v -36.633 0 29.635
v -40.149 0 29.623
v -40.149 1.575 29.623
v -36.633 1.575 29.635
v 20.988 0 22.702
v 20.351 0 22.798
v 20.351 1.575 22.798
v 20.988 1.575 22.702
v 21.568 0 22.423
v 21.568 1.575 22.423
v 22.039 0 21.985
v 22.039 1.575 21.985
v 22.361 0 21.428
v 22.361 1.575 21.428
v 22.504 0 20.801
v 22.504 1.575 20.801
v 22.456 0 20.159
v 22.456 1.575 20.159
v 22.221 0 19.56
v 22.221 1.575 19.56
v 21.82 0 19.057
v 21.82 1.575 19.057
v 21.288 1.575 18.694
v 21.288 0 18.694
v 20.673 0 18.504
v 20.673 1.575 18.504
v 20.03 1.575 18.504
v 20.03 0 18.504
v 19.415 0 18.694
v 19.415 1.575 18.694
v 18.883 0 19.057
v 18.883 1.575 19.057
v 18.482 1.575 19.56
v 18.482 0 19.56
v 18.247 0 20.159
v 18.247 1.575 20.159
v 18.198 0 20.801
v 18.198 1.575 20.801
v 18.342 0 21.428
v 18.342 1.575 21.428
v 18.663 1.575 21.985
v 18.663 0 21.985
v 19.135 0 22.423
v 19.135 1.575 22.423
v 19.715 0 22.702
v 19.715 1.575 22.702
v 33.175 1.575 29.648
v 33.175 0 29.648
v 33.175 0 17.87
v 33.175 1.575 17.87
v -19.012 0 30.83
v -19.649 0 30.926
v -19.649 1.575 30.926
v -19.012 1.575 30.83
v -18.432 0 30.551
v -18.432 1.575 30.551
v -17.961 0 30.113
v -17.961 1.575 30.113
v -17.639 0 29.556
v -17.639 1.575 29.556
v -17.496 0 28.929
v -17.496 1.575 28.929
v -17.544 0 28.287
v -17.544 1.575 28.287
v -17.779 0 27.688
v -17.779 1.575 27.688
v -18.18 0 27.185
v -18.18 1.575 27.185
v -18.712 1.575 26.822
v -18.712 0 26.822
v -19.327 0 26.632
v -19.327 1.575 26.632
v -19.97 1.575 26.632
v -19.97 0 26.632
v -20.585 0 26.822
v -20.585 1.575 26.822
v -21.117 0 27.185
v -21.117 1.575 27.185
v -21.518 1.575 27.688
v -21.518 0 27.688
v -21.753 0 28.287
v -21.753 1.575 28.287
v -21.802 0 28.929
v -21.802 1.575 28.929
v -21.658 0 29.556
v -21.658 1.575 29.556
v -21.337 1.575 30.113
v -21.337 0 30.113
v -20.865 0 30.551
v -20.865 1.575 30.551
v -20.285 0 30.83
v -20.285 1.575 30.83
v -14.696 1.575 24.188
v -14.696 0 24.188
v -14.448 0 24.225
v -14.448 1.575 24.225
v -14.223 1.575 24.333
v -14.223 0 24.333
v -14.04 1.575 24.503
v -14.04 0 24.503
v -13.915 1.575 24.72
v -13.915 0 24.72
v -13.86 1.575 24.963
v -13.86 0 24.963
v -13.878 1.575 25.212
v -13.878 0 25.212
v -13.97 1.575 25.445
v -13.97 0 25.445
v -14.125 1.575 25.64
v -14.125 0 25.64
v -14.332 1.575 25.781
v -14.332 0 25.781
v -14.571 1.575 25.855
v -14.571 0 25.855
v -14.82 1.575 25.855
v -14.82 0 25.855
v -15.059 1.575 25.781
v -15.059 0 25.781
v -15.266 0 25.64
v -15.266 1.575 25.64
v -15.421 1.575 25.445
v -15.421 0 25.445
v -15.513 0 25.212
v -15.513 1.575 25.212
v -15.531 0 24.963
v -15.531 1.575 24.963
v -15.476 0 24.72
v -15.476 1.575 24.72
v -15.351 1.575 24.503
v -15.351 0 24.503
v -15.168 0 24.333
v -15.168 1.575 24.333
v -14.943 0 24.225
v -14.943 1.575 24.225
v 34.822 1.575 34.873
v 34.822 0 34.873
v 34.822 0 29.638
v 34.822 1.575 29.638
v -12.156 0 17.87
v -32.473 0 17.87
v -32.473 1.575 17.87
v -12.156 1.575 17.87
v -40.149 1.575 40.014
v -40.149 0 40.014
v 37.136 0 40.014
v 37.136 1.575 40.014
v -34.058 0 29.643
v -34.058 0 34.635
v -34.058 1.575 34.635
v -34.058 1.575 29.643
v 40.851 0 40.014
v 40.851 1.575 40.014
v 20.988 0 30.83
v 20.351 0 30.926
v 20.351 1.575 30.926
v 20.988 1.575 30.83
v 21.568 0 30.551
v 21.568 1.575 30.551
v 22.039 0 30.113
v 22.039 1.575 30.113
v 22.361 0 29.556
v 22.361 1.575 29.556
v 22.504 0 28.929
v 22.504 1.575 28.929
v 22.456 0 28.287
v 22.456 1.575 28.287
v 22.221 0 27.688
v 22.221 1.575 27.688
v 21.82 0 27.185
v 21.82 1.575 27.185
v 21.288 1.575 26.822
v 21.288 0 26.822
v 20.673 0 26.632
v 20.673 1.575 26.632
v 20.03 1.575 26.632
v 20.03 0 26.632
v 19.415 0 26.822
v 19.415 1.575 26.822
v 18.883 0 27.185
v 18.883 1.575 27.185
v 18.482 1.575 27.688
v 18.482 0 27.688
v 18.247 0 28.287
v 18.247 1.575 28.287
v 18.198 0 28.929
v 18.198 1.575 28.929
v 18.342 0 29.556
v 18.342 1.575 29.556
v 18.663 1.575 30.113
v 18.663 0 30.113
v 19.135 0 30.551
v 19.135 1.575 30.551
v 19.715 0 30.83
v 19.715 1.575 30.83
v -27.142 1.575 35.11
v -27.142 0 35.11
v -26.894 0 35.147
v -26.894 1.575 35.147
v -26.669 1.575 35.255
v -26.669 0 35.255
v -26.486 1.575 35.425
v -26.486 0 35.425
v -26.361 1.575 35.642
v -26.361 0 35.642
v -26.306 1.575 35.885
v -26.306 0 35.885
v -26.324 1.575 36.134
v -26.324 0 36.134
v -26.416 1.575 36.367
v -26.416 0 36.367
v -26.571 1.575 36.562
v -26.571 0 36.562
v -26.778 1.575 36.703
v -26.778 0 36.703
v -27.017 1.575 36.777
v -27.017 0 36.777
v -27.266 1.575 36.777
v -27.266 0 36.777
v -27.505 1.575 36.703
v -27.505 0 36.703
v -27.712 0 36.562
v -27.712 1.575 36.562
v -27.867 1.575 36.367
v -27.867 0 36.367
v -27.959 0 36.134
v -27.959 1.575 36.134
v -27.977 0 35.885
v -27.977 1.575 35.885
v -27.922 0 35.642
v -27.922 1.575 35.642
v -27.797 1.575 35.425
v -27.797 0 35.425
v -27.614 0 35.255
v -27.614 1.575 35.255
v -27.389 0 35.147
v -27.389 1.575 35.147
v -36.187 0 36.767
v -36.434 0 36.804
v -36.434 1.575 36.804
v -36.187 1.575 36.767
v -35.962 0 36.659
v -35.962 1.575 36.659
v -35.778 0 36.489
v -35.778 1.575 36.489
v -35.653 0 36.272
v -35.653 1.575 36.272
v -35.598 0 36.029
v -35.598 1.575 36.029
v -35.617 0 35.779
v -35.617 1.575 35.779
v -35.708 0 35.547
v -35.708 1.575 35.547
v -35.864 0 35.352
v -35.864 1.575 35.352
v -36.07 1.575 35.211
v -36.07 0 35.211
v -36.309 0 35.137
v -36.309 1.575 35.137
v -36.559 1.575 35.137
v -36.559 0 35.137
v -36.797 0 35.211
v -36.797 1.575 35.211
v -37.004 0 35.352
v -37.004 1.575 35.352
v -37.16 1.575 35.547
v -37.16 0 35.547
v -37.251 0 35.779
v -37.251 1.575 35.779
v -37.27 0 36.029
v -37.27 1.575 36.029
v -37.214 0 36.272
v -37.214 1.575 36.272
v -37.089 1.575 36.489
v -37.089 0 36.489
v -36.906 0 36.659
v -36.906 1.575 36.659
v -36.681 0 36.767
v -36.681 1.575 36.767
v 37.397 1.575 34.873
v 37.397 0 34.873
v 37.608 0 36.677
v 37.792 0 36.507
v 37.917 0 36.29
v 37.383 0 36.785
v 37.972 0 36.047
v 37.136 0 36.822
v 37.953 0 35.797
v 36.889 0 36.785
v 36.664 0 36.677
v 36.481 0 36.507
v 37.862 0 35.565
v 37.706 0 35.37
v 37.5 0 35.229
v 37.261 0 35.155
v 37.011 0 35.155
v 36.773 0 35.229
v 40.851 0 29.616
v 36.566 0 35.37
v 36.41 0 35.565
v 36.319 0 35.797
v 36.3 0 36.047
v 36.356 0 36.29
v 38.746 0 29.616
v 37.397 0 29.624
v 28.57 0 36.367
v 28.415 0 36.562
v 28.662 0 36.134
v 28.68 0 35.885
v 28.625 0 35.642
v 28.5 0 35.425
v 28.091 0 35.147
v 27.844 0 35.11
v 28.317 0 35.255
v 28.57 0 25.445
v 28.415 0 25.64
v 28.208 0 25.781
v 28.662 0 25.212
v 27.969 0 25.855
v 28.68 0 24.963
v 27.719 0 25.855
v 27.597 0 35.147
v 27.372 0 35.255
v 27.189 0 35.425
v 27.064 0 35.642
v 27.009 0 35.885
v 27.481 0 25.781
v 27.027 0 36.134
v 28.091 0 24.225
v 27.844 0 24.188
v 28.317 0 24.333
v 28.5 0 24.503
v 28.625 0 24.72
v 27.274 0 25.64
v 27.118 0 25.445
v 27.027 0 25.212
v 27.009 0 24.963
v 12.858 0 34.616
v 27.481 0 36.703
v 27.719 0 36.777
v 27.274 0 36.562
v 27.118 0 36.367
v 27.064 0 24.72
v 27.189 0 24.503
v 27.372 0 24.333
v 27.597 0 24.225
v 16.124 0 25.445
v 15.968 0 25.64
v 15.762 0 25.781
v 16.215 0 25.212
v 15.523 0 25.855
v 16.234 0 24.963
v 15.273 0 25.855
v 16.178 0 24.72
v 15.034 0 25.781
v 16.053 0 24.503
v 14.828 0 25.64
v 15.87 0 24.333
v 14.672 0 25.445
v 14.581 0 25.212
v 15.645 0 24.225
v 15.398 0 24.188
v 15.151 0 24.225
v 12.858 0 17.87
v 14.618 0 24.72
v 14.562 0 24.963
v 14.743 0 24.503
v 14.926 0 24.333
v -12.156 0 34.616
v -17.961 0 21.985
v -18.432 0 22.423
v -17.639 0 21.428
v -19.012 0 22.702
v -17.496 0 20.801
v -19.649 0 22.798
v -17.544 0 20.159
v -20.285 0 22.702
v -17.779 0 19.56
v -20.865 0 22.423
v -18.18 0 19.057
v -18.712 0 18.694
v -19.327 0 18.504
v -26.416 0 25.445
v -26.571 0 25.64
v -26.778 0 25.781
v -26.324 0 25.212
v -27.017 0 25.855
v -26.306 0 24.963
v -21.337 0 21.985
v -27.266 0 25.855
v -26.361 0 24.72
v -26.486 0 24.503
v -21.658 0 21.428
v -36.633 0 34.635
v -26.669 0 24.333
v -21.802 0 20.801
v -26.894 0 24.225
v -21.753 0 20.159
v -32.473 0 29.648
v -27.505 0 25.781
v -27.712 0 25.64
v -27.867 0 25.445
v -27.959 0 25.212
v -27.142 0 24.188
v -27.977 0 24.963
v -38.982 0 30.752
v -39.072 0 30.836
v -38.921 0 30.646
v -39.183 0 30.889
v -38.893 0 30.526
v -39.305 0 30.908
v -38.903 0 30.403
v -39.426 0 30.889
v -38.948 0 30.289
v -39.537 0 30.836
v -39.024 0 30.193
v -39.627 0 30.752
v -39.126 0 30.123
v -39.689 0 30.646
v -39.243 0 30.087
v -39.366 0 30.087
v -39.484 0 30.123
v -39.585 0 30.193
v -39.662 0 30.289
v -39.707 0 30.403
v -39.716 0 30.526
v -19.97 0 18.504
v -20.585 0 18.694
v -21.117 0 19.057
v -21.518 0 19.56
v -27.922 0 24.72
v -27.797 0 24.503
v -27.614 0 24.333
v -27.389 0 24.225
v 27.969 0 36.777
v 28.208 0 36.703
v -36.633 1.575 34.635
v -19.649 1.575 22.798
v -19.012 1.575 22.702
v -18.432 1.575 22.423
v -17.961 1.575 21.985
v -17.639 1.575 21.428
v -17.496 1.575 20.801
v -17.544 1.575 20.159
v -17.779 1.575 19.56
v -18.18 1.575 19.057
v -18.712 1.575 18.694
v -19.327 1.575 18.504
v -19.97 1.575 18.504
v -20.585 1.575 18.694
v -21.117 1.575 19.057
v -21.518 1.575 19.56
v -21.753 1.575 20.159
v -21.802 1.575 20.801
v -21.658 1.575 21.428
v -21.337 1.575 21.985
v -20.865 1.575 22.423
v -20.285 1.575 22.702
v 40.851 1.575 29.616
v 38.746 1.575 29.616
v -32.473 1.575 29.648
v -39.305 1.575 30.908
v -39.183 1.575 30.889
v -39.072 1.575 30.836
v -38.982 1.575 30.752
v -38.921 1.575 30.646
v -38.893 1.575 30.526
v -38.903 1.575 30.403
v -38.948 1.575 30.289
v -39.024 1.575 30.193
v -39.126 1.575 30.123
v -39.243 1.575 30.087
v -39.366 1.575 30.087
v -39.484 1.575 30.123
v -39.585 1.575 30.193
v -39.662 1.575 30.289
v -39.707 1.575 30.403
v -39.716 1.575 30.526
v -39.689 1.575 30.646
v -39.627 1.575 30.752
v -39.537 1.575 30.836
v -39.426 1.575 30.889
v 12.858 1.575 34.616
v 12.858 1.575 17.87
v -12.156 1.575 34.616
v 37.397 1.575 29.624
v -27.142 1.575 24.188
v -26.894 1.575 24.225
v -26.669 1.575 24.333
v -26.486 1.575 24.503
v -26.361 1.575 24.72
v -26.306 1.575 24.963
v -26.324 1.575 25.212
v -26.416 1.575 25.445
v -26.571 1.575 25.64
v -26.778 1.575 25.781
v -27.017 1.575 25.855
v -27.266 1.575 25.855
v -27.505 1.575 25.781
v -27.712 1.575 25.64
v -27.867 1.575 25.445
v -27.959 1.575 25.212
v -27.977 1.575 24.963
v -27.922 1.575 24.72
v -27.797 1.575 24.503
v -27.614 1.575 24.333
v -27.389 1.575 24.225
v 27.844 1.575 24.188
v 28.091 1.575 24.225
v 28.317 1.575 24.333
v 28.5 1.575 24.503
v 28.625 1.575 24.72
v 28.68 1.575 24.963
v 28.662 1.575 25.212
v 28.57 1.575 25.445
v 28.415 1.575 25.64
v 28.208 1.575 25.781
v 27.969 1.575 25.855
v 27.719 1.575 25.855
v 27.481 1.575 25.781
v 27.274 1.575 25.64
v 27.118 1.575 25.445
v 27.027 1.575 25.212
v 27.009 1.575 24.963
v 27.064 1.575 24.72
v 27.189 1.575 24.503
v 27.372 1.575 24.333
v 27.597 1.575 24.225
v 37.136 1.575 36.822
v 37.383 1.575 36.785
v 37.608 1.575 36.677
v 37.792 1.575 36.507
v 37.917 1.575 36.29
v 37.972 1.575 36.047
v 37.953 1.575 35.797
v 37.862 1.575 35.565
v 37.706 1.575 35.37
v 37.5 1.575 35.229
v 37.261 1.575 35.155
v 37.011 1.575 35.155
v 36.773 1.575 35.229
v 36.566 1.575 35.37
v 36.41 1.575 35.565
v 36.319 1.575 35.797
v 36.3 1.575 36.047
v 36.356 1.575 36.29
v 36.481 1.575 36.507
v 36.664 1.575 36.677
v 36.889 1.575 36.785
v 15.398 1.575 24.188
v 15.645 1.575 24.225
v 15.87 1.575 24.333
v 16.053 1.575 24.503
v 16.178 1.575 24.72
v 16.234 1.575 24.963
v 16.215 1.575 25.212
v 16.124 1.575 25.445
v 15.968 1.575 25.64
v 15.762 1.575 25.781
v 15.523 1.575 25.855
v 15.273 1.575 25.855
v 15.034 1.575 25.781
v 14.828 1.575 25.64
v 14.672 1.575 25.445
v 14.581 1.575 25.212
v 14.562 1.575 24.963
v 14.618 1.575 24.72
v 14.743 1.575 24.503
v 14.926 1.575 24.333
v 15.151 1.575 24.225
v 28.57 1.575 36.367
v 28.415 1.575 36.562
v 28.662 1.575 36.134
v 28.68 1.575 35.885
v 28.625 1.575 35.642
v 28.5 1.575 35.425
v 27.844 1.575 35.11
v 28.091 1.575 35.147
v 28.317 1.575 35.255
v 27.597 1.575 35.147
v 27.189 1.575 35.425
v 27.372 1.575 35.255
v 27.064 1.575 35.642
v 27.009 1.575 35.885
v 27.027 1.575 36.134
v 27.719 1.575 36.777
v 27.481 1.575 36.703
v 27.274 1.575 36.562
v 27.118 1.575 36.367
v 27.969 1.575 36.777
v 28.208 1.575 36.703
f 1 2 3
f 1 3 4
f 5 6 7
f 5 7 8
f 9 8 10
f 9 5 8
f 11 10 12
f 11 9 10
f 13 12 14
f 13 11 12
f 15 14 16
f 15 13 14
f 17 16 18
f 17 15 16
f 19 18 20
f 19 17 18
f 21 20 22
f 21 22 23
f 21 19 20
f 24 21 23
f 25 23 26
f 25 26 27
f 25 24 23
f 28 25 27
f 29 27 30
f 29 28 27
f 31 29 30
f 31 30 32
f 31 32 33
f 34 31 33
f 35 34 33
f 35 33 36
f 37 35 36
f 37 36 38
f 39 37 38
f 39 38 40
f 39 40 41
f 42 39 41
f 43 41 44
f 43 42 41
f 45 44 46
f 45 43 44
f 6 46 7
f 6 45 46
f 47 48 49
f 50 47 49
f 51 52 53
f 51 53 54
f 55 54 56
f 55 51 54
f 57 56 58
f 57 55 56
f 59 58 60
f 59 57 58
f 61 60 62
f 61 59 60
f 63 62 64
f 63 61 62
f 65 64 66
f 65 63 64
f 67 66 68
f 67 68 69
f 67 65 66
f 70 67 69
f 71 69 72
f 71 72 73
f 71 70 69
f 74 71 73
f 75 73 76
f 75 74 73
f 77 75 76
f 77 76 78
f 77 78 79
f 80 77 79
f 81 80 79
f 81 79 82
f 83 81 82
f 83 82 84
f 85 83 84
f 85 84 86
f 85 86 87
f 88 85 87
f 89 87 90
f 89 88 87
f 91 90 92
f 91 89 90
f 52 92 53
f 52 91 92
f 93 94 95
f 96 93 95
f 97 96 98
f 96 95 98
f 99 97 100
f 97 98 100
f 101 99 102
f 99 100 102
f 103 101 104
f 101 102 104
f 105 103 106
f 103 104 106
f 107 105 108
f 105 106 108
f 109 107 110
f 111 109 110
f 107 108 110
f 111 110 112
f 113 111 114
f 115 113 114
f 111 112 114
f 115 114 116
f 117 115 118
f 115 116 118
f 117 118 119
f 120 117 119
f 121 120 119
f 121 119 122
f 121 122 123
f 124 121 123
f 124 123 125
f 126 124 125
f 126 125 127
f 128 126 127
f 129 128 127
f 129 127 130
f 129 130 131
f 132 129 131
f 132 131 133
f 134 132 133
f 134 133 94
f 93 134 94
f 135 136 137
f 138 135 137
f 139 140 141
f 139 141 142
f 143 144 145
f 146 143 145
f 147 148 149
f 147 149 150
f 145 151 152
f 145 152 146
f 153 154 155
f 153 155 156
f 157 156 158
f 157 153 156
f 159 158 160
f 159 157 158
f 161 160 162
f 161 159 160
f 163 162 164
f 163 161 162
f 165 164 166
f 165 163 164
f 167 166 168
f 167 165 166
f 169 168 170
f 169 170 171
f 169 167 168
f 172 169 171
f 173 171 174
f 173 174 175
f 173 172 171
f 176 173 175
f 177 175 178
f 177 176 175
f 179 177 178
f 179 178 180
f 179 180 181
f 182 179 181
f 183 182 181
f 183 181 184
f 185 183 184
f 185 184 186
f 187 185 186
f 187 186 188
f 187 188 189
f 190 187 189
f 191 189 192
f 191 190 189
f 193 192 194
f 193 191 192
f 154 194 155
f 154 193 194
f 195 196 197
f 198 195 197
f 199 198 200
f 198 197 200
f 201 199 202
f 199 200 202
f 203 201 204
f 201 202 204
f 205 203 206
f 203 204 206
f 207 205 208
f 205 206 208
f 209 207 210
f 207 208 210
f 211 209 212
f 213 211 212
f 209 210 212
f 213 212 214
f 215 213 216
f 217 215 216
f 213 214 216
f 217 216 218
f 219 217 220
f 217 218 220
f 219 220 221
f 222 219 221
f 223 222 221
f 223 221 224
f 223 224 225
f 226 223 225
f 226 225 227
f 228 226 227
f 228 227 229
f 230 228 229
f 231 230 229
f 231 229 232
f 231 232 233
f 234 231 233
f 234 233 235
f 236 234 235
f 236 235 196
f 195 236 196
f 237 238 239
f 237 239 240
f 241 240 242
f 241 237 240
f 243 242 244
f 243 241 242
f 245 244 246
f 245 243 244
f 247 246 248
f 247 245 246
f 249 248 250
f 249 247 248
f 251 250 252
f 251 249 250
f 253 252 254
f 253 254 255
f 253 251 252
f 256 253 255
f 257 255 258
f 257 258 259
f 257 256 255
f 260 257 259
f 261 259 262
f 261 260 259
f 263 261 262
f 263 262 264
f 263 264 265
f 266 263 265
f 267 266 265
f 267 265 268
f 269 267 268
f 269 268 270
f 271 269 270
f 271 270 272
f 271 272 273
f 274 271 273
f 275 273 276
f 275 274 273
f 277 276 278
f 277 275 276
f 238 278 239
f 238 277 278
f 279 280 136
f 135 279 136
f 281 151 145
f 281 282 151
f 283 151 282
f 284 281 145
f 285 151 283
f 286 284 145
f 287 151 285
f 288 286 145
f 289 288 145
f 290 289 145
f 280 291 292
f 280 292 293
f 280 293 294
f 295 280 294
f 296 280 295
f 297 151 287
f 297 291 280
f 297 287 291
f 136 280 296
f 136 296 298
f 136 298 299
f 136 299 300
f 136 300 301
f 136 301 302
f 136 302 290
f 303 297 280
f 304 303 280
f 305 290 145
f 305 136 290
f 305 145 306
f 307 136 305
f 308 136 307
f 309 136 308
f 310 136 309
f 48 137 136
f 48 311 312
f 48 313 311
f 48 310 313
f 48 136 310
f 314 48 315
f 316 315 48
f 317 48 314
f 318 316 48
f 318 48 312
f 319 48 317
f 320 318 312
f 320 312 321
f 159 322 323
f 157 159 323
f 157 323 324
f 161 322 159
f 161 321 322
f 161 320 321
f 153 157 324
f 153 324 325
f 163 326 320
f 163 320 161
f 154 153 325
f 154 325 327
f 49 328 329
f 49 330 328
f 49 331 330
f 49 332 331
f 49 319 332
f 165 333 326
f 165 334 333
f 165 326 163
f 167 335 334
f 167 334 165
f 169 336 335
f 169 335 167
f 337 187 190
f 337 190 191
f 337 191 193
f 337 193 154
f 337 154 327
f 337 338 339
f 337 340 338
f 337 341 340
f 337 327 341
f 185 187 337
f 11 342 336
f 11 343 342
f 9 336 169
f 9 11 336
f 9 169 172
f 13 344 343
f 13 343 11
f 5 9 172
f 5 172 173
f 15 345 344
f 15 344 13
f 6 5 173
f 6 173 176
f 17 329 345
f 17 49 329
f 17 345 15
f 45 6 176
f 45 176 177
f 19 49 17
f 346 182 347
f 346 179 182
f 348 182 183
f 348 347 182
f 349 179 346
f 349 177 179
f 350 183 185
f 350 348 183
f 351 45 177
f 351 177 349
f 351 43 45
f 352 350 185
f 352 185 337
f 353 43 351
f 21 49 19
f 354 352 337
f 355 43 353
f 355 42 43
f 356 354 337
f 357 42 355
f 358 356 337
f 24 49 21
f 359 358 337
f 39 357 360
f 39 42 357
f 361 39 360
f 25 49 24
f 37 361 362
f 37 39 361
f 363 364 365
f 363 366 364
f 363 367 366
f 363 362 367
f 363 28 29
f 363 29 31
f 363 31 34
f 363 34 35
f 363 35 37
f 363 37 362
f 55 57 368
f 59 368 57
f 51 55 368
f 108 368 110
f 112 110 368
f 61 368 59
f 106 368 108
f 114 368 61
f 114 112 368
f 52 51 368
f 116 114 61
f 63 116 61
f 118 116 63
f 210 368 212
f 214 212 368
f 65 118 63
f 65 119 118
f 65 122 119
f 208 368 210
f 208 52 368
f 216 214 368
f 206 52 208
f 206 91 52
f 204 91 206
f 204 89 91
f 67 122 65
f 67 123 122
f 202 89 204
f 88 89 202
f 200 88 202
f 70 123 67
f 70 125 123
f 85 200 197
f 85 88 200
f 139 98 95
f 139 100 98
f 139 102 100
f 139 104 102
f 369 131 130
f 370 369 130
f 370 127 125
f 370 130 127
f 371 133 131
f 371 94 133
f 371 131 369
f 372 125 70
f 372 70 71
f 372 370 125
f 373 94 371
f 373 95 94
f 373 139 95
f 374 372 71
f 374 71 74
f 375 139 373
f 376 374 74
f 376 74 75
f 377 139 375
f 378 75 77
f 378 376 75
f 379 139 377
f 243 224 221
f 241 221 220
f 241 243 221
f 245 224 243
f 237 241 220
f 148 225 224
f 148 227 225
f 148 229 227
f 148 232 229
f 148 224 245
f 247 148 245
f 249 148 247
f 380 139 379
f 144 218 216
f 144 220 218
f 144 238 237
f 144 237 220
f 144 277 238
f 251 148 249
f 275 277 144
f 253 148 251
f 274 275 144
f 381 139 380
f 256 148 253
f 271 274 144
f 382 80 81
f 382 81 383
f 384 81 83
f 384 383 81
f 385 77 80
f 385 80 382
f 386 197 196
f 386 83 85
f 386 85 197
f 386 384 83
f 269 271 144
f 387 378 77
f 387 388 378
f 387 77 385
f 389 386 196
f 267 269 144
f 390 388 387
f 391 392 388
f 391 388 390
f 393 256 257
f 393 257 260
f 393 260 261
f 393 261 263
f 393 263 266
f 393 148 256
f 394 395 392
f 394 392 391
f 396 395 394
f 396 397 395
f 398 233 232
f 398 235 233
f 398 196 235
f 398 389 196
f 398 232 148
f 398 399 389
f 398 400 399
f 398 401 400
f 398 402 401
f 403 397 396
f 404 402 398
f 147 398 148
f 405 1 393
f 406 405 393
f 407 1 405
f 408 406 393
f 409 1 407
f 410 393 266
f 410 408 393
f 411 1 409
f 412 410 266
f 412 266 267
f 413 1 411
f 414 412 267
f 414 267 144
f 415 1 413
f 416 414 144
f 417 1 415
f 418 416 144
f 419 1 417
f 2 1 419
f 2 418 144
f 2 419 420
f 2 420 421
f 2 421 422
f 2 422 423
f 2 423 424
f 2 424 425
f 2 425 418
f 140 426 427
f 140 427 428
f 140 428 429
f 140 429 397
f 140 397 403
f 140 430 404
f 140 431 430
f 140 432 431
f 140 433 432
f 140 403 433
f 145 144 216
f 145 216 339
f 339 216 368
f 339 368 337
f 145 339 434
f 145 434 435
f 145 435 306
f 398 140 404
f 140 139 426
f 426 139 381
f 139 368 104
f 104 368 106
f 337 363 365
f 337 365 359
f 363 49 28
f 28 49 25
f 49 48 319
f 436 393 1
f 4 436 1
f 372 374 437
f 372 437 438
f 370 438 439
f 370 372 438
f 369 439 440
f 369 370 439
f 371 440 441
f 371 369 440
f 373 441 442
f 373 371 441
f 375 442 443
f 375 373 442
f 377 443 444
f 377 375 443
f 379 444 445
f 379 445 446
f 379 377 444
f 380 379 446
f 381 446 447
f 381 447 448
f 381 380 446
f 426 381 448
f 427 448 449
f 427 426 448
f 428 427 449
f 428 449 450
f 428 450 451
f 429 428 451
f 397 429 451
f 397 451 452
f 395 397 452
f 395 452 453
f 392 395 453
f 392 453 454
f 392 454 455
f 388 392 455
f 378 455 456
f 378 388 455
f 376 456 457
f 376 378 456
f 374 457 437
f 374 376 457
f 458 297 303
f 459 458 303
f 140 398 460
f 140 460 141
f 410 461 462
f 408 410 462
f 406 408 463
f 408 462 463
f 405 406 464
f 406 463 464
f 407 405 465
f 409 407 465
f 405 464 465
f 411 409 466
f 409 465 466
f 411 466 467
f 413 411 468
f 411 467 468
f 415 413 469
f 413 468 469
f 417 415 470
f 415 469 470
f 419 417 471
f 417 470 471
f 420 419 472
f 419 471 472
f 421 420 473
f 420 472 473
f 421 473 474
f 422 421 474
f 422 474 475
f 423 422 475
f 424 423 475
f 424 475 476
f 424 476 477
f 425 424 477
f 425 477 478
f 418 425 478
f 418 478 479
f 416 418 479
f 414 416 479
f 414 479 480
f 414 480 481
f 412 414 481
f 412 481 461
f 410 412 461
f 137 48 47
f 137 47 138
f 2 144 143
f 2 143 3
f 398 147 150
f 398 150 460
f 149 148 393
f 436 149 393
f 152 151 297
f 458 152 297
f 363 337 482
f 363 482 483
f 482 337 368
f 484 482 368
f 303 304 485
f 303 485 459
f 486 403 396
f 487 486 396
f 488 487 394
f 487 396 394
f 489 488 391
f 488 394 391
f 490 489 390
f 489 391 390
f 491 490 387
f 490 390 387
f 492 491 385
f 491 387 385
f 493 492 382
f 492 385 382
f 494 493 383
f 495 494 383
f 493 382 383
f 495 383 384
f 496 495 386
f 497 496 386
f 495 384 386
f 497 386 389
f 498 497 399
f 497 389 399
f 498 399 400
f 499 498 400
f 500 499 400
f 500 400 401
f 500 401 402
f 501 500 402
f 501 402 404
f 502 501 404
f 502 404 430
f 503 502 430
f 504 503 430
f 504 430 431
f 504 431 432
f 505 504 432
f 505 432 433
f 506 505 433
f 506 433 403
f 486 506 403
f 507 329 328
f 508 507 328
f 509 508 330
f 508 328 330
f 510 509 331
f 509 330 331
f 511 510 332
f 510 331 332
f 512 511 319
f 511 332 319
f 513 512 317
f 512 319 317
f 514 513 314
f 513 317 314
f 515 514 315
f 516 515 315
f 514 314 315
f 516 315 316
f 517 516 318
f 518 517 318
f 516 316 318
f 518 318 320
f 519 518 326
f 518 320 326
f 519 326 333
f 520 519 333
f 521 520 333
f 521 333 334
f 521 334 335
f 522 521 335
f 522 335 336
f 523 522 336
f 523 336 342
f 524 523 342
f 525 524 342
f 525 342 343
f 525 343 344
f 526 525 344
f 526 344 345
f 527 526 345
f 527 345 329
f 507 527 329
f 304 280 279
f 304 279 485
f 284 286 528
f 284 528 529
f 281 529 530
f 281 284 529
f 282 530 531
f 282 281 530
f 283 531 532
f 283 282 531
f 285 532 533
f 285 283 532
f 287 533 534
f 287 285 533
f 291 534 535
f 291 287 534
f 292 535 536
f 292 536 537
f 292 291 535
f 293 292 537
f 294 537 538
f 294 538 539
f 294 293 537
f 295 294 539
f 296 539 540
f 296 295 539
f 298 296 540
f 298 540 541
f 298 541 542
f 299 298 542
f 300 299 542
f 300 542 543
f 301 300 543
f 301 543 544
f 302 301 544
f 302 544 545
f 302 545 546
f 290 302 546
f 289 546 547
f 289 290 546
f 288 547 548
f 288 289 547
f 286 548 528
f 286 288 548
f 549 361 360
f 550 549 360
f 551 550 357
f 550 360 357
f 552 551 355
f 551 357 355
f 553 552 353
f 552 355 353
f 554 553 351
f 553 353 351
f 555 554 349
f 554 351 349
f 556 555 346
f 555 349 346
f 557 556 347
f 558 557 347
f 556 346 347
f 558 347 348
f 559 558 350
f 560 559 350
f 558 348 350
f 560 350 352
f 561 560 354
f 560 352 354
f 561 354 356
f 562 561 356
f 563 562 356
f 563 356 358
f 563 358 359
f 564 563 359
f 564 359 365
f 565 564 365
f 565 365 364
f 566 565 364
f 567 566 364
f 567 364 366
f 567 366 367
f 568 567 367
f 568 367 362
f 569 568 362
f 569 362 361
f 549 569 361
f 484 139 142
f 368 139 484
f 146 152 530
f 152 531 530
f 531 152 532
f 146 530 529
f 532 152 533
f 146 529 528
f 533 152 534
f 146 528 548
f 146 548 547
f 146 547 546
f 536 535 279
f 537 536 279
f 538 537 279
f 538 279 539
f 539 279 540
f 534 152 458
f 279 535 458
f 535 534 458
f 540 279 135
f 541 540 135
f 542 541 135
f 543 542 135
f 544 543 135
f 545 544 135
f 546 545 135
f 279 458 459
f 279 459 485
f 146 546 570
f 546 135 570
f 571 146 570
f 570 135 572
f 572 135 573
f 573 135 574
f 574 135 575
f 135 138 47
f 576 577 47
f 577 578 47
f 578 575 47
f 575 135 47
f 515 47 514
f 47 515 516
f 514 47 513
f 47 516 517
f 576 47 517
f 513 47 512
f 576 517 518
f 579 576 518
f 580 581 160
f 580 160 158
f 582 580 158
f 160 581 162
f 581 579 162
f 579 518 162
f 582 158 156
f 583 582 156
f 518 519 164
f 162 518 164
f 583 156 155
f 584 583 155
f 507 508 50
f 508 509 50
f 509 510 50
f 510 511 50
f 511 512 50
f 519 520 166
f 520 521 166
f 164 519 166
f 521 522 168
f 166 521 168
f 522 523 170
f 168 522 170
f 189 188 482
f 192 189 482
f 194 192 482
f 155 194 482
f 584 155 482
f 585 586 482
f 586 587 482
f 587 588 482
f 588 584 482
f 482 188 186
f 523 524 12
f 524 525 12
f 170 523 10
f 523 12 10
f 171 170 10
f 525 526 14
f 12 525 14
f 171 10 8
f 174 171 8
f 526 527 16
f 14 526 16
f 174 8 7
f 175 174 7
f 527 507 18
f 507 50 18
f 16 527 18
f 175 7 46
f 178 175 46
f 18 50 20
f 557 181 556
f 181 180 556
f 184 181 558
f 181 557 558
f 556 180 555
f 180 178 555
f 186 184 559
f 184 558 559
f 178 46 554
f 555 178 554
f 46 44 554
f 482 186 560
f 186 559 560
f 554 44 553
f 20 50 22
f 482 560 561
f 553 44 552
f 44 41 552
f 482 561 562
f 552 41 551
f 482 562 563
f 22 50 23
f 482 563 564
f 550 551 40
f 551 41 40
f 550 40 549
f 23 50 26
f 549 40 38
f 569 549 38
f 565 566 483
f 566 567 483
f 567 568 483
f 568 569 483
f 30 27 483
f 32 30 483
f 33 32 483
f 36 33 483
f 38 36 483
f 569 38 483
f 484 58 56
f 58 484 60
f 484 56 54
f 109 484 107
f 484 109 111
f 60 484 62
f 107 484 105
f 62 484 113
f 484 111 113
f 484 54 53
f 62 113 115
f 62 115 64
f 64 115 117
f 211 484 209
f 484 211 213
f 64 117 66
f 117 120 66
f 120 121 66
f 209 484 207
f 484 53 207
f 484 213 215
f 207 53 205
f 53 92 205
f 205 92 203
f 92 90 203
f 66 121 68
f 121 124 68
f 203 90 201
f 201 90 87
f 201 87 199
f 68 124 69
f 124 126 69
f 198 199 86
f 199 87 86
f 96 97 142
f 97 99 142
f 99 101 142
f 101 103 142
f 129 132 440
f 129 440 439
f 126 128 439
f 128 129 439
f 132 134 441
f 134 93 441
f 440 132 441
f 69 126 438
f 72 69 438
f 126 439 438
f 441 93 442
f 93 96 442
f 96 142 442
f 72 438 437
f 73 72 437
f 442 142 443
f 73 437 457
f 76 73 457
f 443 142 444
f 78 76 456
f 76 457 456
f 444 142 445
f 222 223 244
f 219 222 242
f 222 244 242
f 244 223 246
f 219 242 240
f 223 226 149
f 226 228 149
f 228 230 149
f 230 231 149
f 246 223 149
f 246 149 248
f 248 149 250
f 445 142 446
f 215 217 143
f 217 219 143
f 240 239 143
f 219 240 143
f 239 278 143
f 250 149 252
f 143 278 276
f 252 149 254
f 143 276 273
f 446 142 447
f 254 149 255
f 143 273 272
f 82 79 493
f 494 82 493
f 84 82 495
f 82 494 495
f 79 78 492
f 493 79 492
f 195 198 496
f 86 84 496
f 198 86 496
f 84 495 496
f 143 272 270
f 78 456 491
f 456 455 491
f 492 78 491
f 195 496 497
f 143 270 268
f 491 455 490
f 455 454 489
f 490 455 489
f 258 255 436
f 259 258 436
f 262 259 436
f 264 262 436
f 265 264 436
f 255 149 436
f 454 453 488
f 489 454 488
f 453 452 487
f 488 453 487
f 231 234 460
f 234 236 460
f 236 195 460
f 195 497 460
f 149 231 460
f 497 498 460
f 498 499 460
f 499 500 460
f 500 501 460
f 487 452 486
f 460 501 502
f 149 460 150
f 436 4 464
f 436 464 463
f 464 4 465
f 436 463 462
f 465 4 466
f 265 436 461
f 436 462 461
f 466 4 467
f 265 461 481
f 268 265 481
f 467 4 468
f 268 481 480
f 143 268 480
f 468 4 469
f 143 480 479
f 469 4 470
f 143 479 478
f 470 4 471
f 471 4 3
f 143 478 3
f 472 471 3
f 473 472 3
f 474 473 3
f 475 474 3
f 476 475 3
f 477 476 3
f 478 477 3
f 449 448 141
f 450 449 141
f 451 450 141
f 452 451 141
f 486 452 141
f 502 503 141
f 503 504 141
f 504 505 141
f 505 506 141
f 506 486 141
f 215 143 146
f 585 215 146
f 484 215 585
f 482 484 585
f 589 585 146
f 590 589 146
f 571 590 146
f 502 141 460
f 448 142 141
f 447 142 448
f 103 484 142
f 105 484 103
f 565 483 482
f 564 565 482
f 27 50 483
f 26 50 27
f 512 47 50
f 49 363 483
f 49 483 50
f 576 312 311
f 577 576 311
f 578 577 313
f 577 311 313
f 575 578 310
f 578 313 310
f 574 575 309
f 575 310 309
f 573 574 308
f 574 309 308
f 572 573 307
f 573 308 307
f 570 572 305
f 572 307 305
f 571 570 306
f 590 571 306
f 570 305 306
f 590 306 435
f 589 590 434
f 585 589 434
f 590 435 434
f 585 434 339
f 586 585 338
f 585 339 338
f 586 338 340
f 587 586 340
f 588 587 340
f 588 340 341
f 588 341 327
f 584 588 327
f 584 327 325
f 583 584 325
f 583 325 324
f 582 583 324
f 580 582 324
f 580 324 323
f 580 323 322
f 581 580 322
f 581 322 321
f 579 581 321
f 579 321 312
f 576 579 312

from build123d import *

# Parameters (mm, degrees)
SKETCH1_R           = 0.8382
SKETCH1_R_2         = 2.159
BOSS_EXTRUDE1_DEPTH = 1.575
SKETCH2_W           = 86.242658642
SKETCH2_H           = 6.602
CUT_EXTRUDE1_DEPTH  = 65.362755899
CUT_EXTRUDE2_DEPTH  = 60.755092082
CUT_EXTRUDE3_DEPTH  = 60.755092082
SKETCH6_R           = 0.8382
CUT_EXTRUDE4_DEPTH  = 2.54
SKETCH7_W           = 65.648
SKETCH7_H           = 7.5
CUT_EXTRUDE5_DEPTH  = 58.2054366
SKETCH11_R          = 0.412551942
ID_HOLE_DEPTH       = 58.2054366
SKETCH12_W          = 2.575
SKETCH12_H          = 5
CUT_EXTRUDE6_DEPTH  = 58.2054366
SKETCH14_W          = 2.575
SKETCH14_H          = 17.002619879
CUT_EXTRUDE7_DEPTH  = 58.2054366


with BuildPart() as part:
    # Sketch1 → Boss-Extrude1 (new body)
    with BuildSketch(Plane(origin=(0, 0, 0), x_dir=(1, 0, 0), z_dir=(0, 1, 0))):
        Polygon((44.351293299, -40.014412246), (37.136293299, -40.014412246), (37.136293299, -46.615946892), (29.968293307, -46.615946892), (-30.083706693, -46.615946892), (-36.433706701, -46.615946892), (-36.433706701, -40.014412246), (-43.648706701, -40.014412246), (-43.648706701, -30.885946892), (-43.648706701, -29.647946892), (-42.378706693, -29.615946892), (-32.472706701, -29.647946892), (-32.472706701, -10.370428445), (-12.155556701, -10.370428445), (-12.155556701, -34.615947016), (-11.557706701, -34.615947016), (12.260293299, -34.615947016), (12.858143299, -34.615947016), (12.858143299, -10.370428445), (33.175293299, -10.370428445), (33.175293299, -12.929386892), (33.175293299, -29.647946892), (38.746293307, -29.615946892), (42.351293307, -29.615946892), (44.351293299, -29.615946892), (44.351293299, -31.651946892), align=None)
        with Locations(Location((-36.433706701, -35.965946892, 0), (0, 0, 270))):
            Circle(SKETCH1_R, mode=Mode.SUBTRACT)
        with Locations(Location((37.136293299, -35.983946892, 0), (0, 0, 270))):
            Circle(SKETCH1_R, mode=Mode.SUBTRACT)
        with Locations(Location((-19.648556701, -28.76738335, 0), (0, 0, 270))):
            Circle(SKETCH1_R_2, mode=Mode.SUBTRACT)
        with Locations(Location((-19.648556701, -20.63938335, 0), (0, 0, 270))):
            Circle(SKETCH1_R_2, mode=Mode.SUBTRACT)
        with Locations(Location((20.351397299, -20.63938335, 0), (0, 0, 270))):
            Circle(SKETCH1_R_2, mode=Mode.SUBTRACT)
        with Locations(Location((20.351397299, -28.76738335, 0), (0, 0, 270))):
            Circle(SKETCH1_R_2, mode=Mode.SUBTRACT)
    extrude(amount=BOSS_EXTRUDE1_DEPTH)

    # Sketch2 → Cut-Extrude1 (cut, through all)
    with BuildSketch(Plane.XZ):
        with Locations((-5.985036022, 43.314946892)):
            Rectangle(SKETCH2_W, SKETCH2_H)
    extrude(amount=-CUT_EXTRUDE1_DEPTH, mode=Mode.SUBTRACT)

    # Sketch3 → Cut-Extrude2 (cut, through all)
    with BuildSketch(Plane.XZ):
        Polygon((-40.148706701, 40.013946892), (-40.148706701, 29.623150607), (-34.773706693, 29.640513821), (-34.773706693, 8.975624969), (-46.772834391, 8.975624969), (-46.772834391, 40.013946892), align=None)
    extrude(amount=-CUT_EXTRUDE2_DEPTH, mode=Mode.SUBTRACT)

    # Sketch4 → Cut-Extrude3 (cut, through all)
    with BuildSketch(Plane.XZ):
        Polygon((40.851293299, 40.014412246), (40.851293299, 32.420104455), (40.851293299, 29.615946892), (35.476293307, 29.615946892), (35.476293307, 10.370428445), (54.710892309, 10.370428445), (54.710892309, 40.014412246), align=None)
    extrude(amount=-CUT_EXTRUDE3_DEPTH, mode=Mode.SUBTRACT)

    # Sketch6 → Cut-Extrude4 (cut)
    with BuildSketch(Plane(origin=(0, 0, 0), x_dir=(-1, 0, 0), z_dir=(0, -1, 0))):
        with Locations(Location((27.141556701, -35.947946892, 0), (0, 0, 90))):
            Circle(SKETCH6_R)
        with Locations(Location((27.141556701, -25.025946892, 0), (0, 0, 90))):
            Circle(SKETCH6_R)
        with Locations(Location((14.695556701, -25.025946892, 0), (0, 0, 90))):
            Circle(SKETCH6_R)
        with Locations(Location((-15.398143299, -25.025946892, 0), (0, 0, 90))):
            Circle(SKETCH6_R)
        with Locations(Location((-27.844397299, -25.025946892, 0), (0, 0, 90))):
            Circle(SKETCH6_R)
        with Locations(Location((-27.844397299, -35.947946892, 0), (0, 0, 90))):
            Circle(SKETCH6_R)
    extrude(amount=-CUT_EXTRUDE4_DEPTH, mode=Mode.SUBTRACT)

    # Sketch7 → Cut-Extrude5 (cut, through all)
    with BuildSketch(Plane.XZ):
        with Locations((0.351293299, 14.120428445)):
            Rectangle(SKETCH7_W, SKETCH7_H)
    extrude(amount=-CUT_EXTRUDE5_DEPTH, mode=Mode.SUBTRACT)

    # Sketch11 → ID HOLE (cut, through all)
    with BuildSketch(Plane(origin=(0, 1.575, 0), x_dir=(1, 0, 0), z_dir=(0, 1, 0))):
        with Locations(Location((-39.304798754, -30.495020326, 0), (0, 0, 270))):
            Circle(SKETCH11_R)
    extrude(amount=-ID_HOLE_DEPTH, mode=Mode.SUBTRACT)

    # Sketch12 → Cut-Extrude6 (cut, through all)
    with BuildSketch(Plane(origin=(0, 0, 0), x_dir=(-1, 0, 0), z_dir=(0, -1, 0))):
        with Locations((35.345206701, -32.134508572)):
            Rectangle(SKETCH12_W, SKETCH12_H)
    extrude(amount=-CUT_EXTRUDE6_DEPTH, mode=Mode.SUBTRACT)

    # Sketch14 → Cut-Extrude7 (cut, through all)
    with BuildSketch(Plane(origin=(0, 0, 0), x_dir=(-1, 0, 0), z_dir=(0, -1, 0))):
        with Locations((-36.109793299, -26.371738385)):
            Rectangle(SKETCH14_W, SKETCH14_H)
    extrude(amount=-CUT_EXTRUDE7_DEPTH, mode=Mode.SUBTRACT)


solid = part.part
